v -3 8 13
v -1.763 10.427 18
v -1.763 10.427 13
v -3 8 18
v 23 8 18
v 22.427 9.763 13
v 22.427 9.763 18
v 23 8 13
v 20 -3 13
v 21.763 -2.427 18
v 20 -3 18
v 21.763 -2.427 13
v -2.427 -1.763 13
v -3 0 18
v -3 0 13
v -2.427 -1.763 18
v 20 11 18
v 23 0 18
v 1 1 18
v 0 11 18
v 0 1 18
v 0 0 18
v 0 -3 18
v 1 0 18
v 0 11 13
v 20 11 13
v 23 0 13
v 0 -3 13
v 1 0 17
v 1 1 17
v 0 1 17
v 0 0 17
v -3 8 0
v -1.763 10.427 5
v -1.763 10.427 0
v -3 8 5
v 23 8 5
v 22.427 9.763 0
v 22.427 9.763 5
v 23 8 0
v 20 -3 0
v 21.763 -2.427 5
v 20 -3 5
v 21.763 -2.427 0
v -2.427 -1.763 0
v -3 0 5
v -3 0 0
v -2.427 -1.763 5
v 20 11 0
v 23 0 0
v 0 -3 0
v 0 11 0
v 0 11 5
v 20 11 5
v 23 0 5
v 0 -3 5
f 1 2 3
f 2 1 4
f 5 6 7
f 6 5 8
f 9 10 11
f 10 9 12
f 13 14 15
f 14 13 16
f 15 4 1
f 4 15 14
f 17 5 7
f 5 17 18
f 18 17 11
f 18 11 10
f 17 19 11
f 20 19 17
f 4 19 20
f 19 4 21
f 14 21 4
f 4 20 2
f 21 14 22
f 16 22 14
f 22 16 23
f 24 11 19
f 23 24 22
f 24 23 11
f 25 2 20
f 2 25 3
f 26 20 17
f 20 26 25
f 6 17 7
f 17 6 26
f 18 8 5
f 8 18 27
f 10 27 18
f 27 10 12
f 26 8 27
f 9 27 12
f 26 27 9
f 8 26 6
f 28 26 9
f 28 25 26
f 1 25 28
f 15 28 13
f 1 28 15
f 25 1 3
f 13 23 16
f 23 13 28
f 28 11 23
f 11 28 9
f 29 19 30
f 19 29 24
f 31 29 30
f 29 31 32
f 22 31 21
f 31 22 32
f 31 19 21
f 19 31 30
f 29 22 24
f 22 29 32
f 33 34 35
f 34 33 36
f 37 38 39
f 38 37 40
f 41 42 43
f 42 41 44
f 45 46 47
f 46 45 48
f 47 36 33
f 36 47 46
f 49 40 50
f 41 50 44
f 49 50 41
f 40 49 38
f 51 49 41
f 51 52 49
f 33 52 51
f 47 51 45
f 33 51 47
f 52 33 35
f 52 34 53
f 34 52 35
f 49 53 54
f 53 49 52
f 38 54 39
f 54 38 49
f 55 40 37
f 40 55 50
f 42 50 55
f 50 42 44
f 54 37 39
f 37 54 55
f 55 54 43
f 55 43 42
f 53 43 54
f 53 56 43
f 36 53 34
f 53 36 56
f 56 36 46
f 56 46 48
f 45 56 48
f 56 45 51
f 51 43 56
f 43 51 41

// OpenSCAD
module base() {
  linear_extrude(5) offset(3) square([20, 8]);
}

module lid() {
  difference() {
    base();
    cube();
  }
}

base();

translate([0, 0, 18]) mirror([0, 0, 1]) lid();
